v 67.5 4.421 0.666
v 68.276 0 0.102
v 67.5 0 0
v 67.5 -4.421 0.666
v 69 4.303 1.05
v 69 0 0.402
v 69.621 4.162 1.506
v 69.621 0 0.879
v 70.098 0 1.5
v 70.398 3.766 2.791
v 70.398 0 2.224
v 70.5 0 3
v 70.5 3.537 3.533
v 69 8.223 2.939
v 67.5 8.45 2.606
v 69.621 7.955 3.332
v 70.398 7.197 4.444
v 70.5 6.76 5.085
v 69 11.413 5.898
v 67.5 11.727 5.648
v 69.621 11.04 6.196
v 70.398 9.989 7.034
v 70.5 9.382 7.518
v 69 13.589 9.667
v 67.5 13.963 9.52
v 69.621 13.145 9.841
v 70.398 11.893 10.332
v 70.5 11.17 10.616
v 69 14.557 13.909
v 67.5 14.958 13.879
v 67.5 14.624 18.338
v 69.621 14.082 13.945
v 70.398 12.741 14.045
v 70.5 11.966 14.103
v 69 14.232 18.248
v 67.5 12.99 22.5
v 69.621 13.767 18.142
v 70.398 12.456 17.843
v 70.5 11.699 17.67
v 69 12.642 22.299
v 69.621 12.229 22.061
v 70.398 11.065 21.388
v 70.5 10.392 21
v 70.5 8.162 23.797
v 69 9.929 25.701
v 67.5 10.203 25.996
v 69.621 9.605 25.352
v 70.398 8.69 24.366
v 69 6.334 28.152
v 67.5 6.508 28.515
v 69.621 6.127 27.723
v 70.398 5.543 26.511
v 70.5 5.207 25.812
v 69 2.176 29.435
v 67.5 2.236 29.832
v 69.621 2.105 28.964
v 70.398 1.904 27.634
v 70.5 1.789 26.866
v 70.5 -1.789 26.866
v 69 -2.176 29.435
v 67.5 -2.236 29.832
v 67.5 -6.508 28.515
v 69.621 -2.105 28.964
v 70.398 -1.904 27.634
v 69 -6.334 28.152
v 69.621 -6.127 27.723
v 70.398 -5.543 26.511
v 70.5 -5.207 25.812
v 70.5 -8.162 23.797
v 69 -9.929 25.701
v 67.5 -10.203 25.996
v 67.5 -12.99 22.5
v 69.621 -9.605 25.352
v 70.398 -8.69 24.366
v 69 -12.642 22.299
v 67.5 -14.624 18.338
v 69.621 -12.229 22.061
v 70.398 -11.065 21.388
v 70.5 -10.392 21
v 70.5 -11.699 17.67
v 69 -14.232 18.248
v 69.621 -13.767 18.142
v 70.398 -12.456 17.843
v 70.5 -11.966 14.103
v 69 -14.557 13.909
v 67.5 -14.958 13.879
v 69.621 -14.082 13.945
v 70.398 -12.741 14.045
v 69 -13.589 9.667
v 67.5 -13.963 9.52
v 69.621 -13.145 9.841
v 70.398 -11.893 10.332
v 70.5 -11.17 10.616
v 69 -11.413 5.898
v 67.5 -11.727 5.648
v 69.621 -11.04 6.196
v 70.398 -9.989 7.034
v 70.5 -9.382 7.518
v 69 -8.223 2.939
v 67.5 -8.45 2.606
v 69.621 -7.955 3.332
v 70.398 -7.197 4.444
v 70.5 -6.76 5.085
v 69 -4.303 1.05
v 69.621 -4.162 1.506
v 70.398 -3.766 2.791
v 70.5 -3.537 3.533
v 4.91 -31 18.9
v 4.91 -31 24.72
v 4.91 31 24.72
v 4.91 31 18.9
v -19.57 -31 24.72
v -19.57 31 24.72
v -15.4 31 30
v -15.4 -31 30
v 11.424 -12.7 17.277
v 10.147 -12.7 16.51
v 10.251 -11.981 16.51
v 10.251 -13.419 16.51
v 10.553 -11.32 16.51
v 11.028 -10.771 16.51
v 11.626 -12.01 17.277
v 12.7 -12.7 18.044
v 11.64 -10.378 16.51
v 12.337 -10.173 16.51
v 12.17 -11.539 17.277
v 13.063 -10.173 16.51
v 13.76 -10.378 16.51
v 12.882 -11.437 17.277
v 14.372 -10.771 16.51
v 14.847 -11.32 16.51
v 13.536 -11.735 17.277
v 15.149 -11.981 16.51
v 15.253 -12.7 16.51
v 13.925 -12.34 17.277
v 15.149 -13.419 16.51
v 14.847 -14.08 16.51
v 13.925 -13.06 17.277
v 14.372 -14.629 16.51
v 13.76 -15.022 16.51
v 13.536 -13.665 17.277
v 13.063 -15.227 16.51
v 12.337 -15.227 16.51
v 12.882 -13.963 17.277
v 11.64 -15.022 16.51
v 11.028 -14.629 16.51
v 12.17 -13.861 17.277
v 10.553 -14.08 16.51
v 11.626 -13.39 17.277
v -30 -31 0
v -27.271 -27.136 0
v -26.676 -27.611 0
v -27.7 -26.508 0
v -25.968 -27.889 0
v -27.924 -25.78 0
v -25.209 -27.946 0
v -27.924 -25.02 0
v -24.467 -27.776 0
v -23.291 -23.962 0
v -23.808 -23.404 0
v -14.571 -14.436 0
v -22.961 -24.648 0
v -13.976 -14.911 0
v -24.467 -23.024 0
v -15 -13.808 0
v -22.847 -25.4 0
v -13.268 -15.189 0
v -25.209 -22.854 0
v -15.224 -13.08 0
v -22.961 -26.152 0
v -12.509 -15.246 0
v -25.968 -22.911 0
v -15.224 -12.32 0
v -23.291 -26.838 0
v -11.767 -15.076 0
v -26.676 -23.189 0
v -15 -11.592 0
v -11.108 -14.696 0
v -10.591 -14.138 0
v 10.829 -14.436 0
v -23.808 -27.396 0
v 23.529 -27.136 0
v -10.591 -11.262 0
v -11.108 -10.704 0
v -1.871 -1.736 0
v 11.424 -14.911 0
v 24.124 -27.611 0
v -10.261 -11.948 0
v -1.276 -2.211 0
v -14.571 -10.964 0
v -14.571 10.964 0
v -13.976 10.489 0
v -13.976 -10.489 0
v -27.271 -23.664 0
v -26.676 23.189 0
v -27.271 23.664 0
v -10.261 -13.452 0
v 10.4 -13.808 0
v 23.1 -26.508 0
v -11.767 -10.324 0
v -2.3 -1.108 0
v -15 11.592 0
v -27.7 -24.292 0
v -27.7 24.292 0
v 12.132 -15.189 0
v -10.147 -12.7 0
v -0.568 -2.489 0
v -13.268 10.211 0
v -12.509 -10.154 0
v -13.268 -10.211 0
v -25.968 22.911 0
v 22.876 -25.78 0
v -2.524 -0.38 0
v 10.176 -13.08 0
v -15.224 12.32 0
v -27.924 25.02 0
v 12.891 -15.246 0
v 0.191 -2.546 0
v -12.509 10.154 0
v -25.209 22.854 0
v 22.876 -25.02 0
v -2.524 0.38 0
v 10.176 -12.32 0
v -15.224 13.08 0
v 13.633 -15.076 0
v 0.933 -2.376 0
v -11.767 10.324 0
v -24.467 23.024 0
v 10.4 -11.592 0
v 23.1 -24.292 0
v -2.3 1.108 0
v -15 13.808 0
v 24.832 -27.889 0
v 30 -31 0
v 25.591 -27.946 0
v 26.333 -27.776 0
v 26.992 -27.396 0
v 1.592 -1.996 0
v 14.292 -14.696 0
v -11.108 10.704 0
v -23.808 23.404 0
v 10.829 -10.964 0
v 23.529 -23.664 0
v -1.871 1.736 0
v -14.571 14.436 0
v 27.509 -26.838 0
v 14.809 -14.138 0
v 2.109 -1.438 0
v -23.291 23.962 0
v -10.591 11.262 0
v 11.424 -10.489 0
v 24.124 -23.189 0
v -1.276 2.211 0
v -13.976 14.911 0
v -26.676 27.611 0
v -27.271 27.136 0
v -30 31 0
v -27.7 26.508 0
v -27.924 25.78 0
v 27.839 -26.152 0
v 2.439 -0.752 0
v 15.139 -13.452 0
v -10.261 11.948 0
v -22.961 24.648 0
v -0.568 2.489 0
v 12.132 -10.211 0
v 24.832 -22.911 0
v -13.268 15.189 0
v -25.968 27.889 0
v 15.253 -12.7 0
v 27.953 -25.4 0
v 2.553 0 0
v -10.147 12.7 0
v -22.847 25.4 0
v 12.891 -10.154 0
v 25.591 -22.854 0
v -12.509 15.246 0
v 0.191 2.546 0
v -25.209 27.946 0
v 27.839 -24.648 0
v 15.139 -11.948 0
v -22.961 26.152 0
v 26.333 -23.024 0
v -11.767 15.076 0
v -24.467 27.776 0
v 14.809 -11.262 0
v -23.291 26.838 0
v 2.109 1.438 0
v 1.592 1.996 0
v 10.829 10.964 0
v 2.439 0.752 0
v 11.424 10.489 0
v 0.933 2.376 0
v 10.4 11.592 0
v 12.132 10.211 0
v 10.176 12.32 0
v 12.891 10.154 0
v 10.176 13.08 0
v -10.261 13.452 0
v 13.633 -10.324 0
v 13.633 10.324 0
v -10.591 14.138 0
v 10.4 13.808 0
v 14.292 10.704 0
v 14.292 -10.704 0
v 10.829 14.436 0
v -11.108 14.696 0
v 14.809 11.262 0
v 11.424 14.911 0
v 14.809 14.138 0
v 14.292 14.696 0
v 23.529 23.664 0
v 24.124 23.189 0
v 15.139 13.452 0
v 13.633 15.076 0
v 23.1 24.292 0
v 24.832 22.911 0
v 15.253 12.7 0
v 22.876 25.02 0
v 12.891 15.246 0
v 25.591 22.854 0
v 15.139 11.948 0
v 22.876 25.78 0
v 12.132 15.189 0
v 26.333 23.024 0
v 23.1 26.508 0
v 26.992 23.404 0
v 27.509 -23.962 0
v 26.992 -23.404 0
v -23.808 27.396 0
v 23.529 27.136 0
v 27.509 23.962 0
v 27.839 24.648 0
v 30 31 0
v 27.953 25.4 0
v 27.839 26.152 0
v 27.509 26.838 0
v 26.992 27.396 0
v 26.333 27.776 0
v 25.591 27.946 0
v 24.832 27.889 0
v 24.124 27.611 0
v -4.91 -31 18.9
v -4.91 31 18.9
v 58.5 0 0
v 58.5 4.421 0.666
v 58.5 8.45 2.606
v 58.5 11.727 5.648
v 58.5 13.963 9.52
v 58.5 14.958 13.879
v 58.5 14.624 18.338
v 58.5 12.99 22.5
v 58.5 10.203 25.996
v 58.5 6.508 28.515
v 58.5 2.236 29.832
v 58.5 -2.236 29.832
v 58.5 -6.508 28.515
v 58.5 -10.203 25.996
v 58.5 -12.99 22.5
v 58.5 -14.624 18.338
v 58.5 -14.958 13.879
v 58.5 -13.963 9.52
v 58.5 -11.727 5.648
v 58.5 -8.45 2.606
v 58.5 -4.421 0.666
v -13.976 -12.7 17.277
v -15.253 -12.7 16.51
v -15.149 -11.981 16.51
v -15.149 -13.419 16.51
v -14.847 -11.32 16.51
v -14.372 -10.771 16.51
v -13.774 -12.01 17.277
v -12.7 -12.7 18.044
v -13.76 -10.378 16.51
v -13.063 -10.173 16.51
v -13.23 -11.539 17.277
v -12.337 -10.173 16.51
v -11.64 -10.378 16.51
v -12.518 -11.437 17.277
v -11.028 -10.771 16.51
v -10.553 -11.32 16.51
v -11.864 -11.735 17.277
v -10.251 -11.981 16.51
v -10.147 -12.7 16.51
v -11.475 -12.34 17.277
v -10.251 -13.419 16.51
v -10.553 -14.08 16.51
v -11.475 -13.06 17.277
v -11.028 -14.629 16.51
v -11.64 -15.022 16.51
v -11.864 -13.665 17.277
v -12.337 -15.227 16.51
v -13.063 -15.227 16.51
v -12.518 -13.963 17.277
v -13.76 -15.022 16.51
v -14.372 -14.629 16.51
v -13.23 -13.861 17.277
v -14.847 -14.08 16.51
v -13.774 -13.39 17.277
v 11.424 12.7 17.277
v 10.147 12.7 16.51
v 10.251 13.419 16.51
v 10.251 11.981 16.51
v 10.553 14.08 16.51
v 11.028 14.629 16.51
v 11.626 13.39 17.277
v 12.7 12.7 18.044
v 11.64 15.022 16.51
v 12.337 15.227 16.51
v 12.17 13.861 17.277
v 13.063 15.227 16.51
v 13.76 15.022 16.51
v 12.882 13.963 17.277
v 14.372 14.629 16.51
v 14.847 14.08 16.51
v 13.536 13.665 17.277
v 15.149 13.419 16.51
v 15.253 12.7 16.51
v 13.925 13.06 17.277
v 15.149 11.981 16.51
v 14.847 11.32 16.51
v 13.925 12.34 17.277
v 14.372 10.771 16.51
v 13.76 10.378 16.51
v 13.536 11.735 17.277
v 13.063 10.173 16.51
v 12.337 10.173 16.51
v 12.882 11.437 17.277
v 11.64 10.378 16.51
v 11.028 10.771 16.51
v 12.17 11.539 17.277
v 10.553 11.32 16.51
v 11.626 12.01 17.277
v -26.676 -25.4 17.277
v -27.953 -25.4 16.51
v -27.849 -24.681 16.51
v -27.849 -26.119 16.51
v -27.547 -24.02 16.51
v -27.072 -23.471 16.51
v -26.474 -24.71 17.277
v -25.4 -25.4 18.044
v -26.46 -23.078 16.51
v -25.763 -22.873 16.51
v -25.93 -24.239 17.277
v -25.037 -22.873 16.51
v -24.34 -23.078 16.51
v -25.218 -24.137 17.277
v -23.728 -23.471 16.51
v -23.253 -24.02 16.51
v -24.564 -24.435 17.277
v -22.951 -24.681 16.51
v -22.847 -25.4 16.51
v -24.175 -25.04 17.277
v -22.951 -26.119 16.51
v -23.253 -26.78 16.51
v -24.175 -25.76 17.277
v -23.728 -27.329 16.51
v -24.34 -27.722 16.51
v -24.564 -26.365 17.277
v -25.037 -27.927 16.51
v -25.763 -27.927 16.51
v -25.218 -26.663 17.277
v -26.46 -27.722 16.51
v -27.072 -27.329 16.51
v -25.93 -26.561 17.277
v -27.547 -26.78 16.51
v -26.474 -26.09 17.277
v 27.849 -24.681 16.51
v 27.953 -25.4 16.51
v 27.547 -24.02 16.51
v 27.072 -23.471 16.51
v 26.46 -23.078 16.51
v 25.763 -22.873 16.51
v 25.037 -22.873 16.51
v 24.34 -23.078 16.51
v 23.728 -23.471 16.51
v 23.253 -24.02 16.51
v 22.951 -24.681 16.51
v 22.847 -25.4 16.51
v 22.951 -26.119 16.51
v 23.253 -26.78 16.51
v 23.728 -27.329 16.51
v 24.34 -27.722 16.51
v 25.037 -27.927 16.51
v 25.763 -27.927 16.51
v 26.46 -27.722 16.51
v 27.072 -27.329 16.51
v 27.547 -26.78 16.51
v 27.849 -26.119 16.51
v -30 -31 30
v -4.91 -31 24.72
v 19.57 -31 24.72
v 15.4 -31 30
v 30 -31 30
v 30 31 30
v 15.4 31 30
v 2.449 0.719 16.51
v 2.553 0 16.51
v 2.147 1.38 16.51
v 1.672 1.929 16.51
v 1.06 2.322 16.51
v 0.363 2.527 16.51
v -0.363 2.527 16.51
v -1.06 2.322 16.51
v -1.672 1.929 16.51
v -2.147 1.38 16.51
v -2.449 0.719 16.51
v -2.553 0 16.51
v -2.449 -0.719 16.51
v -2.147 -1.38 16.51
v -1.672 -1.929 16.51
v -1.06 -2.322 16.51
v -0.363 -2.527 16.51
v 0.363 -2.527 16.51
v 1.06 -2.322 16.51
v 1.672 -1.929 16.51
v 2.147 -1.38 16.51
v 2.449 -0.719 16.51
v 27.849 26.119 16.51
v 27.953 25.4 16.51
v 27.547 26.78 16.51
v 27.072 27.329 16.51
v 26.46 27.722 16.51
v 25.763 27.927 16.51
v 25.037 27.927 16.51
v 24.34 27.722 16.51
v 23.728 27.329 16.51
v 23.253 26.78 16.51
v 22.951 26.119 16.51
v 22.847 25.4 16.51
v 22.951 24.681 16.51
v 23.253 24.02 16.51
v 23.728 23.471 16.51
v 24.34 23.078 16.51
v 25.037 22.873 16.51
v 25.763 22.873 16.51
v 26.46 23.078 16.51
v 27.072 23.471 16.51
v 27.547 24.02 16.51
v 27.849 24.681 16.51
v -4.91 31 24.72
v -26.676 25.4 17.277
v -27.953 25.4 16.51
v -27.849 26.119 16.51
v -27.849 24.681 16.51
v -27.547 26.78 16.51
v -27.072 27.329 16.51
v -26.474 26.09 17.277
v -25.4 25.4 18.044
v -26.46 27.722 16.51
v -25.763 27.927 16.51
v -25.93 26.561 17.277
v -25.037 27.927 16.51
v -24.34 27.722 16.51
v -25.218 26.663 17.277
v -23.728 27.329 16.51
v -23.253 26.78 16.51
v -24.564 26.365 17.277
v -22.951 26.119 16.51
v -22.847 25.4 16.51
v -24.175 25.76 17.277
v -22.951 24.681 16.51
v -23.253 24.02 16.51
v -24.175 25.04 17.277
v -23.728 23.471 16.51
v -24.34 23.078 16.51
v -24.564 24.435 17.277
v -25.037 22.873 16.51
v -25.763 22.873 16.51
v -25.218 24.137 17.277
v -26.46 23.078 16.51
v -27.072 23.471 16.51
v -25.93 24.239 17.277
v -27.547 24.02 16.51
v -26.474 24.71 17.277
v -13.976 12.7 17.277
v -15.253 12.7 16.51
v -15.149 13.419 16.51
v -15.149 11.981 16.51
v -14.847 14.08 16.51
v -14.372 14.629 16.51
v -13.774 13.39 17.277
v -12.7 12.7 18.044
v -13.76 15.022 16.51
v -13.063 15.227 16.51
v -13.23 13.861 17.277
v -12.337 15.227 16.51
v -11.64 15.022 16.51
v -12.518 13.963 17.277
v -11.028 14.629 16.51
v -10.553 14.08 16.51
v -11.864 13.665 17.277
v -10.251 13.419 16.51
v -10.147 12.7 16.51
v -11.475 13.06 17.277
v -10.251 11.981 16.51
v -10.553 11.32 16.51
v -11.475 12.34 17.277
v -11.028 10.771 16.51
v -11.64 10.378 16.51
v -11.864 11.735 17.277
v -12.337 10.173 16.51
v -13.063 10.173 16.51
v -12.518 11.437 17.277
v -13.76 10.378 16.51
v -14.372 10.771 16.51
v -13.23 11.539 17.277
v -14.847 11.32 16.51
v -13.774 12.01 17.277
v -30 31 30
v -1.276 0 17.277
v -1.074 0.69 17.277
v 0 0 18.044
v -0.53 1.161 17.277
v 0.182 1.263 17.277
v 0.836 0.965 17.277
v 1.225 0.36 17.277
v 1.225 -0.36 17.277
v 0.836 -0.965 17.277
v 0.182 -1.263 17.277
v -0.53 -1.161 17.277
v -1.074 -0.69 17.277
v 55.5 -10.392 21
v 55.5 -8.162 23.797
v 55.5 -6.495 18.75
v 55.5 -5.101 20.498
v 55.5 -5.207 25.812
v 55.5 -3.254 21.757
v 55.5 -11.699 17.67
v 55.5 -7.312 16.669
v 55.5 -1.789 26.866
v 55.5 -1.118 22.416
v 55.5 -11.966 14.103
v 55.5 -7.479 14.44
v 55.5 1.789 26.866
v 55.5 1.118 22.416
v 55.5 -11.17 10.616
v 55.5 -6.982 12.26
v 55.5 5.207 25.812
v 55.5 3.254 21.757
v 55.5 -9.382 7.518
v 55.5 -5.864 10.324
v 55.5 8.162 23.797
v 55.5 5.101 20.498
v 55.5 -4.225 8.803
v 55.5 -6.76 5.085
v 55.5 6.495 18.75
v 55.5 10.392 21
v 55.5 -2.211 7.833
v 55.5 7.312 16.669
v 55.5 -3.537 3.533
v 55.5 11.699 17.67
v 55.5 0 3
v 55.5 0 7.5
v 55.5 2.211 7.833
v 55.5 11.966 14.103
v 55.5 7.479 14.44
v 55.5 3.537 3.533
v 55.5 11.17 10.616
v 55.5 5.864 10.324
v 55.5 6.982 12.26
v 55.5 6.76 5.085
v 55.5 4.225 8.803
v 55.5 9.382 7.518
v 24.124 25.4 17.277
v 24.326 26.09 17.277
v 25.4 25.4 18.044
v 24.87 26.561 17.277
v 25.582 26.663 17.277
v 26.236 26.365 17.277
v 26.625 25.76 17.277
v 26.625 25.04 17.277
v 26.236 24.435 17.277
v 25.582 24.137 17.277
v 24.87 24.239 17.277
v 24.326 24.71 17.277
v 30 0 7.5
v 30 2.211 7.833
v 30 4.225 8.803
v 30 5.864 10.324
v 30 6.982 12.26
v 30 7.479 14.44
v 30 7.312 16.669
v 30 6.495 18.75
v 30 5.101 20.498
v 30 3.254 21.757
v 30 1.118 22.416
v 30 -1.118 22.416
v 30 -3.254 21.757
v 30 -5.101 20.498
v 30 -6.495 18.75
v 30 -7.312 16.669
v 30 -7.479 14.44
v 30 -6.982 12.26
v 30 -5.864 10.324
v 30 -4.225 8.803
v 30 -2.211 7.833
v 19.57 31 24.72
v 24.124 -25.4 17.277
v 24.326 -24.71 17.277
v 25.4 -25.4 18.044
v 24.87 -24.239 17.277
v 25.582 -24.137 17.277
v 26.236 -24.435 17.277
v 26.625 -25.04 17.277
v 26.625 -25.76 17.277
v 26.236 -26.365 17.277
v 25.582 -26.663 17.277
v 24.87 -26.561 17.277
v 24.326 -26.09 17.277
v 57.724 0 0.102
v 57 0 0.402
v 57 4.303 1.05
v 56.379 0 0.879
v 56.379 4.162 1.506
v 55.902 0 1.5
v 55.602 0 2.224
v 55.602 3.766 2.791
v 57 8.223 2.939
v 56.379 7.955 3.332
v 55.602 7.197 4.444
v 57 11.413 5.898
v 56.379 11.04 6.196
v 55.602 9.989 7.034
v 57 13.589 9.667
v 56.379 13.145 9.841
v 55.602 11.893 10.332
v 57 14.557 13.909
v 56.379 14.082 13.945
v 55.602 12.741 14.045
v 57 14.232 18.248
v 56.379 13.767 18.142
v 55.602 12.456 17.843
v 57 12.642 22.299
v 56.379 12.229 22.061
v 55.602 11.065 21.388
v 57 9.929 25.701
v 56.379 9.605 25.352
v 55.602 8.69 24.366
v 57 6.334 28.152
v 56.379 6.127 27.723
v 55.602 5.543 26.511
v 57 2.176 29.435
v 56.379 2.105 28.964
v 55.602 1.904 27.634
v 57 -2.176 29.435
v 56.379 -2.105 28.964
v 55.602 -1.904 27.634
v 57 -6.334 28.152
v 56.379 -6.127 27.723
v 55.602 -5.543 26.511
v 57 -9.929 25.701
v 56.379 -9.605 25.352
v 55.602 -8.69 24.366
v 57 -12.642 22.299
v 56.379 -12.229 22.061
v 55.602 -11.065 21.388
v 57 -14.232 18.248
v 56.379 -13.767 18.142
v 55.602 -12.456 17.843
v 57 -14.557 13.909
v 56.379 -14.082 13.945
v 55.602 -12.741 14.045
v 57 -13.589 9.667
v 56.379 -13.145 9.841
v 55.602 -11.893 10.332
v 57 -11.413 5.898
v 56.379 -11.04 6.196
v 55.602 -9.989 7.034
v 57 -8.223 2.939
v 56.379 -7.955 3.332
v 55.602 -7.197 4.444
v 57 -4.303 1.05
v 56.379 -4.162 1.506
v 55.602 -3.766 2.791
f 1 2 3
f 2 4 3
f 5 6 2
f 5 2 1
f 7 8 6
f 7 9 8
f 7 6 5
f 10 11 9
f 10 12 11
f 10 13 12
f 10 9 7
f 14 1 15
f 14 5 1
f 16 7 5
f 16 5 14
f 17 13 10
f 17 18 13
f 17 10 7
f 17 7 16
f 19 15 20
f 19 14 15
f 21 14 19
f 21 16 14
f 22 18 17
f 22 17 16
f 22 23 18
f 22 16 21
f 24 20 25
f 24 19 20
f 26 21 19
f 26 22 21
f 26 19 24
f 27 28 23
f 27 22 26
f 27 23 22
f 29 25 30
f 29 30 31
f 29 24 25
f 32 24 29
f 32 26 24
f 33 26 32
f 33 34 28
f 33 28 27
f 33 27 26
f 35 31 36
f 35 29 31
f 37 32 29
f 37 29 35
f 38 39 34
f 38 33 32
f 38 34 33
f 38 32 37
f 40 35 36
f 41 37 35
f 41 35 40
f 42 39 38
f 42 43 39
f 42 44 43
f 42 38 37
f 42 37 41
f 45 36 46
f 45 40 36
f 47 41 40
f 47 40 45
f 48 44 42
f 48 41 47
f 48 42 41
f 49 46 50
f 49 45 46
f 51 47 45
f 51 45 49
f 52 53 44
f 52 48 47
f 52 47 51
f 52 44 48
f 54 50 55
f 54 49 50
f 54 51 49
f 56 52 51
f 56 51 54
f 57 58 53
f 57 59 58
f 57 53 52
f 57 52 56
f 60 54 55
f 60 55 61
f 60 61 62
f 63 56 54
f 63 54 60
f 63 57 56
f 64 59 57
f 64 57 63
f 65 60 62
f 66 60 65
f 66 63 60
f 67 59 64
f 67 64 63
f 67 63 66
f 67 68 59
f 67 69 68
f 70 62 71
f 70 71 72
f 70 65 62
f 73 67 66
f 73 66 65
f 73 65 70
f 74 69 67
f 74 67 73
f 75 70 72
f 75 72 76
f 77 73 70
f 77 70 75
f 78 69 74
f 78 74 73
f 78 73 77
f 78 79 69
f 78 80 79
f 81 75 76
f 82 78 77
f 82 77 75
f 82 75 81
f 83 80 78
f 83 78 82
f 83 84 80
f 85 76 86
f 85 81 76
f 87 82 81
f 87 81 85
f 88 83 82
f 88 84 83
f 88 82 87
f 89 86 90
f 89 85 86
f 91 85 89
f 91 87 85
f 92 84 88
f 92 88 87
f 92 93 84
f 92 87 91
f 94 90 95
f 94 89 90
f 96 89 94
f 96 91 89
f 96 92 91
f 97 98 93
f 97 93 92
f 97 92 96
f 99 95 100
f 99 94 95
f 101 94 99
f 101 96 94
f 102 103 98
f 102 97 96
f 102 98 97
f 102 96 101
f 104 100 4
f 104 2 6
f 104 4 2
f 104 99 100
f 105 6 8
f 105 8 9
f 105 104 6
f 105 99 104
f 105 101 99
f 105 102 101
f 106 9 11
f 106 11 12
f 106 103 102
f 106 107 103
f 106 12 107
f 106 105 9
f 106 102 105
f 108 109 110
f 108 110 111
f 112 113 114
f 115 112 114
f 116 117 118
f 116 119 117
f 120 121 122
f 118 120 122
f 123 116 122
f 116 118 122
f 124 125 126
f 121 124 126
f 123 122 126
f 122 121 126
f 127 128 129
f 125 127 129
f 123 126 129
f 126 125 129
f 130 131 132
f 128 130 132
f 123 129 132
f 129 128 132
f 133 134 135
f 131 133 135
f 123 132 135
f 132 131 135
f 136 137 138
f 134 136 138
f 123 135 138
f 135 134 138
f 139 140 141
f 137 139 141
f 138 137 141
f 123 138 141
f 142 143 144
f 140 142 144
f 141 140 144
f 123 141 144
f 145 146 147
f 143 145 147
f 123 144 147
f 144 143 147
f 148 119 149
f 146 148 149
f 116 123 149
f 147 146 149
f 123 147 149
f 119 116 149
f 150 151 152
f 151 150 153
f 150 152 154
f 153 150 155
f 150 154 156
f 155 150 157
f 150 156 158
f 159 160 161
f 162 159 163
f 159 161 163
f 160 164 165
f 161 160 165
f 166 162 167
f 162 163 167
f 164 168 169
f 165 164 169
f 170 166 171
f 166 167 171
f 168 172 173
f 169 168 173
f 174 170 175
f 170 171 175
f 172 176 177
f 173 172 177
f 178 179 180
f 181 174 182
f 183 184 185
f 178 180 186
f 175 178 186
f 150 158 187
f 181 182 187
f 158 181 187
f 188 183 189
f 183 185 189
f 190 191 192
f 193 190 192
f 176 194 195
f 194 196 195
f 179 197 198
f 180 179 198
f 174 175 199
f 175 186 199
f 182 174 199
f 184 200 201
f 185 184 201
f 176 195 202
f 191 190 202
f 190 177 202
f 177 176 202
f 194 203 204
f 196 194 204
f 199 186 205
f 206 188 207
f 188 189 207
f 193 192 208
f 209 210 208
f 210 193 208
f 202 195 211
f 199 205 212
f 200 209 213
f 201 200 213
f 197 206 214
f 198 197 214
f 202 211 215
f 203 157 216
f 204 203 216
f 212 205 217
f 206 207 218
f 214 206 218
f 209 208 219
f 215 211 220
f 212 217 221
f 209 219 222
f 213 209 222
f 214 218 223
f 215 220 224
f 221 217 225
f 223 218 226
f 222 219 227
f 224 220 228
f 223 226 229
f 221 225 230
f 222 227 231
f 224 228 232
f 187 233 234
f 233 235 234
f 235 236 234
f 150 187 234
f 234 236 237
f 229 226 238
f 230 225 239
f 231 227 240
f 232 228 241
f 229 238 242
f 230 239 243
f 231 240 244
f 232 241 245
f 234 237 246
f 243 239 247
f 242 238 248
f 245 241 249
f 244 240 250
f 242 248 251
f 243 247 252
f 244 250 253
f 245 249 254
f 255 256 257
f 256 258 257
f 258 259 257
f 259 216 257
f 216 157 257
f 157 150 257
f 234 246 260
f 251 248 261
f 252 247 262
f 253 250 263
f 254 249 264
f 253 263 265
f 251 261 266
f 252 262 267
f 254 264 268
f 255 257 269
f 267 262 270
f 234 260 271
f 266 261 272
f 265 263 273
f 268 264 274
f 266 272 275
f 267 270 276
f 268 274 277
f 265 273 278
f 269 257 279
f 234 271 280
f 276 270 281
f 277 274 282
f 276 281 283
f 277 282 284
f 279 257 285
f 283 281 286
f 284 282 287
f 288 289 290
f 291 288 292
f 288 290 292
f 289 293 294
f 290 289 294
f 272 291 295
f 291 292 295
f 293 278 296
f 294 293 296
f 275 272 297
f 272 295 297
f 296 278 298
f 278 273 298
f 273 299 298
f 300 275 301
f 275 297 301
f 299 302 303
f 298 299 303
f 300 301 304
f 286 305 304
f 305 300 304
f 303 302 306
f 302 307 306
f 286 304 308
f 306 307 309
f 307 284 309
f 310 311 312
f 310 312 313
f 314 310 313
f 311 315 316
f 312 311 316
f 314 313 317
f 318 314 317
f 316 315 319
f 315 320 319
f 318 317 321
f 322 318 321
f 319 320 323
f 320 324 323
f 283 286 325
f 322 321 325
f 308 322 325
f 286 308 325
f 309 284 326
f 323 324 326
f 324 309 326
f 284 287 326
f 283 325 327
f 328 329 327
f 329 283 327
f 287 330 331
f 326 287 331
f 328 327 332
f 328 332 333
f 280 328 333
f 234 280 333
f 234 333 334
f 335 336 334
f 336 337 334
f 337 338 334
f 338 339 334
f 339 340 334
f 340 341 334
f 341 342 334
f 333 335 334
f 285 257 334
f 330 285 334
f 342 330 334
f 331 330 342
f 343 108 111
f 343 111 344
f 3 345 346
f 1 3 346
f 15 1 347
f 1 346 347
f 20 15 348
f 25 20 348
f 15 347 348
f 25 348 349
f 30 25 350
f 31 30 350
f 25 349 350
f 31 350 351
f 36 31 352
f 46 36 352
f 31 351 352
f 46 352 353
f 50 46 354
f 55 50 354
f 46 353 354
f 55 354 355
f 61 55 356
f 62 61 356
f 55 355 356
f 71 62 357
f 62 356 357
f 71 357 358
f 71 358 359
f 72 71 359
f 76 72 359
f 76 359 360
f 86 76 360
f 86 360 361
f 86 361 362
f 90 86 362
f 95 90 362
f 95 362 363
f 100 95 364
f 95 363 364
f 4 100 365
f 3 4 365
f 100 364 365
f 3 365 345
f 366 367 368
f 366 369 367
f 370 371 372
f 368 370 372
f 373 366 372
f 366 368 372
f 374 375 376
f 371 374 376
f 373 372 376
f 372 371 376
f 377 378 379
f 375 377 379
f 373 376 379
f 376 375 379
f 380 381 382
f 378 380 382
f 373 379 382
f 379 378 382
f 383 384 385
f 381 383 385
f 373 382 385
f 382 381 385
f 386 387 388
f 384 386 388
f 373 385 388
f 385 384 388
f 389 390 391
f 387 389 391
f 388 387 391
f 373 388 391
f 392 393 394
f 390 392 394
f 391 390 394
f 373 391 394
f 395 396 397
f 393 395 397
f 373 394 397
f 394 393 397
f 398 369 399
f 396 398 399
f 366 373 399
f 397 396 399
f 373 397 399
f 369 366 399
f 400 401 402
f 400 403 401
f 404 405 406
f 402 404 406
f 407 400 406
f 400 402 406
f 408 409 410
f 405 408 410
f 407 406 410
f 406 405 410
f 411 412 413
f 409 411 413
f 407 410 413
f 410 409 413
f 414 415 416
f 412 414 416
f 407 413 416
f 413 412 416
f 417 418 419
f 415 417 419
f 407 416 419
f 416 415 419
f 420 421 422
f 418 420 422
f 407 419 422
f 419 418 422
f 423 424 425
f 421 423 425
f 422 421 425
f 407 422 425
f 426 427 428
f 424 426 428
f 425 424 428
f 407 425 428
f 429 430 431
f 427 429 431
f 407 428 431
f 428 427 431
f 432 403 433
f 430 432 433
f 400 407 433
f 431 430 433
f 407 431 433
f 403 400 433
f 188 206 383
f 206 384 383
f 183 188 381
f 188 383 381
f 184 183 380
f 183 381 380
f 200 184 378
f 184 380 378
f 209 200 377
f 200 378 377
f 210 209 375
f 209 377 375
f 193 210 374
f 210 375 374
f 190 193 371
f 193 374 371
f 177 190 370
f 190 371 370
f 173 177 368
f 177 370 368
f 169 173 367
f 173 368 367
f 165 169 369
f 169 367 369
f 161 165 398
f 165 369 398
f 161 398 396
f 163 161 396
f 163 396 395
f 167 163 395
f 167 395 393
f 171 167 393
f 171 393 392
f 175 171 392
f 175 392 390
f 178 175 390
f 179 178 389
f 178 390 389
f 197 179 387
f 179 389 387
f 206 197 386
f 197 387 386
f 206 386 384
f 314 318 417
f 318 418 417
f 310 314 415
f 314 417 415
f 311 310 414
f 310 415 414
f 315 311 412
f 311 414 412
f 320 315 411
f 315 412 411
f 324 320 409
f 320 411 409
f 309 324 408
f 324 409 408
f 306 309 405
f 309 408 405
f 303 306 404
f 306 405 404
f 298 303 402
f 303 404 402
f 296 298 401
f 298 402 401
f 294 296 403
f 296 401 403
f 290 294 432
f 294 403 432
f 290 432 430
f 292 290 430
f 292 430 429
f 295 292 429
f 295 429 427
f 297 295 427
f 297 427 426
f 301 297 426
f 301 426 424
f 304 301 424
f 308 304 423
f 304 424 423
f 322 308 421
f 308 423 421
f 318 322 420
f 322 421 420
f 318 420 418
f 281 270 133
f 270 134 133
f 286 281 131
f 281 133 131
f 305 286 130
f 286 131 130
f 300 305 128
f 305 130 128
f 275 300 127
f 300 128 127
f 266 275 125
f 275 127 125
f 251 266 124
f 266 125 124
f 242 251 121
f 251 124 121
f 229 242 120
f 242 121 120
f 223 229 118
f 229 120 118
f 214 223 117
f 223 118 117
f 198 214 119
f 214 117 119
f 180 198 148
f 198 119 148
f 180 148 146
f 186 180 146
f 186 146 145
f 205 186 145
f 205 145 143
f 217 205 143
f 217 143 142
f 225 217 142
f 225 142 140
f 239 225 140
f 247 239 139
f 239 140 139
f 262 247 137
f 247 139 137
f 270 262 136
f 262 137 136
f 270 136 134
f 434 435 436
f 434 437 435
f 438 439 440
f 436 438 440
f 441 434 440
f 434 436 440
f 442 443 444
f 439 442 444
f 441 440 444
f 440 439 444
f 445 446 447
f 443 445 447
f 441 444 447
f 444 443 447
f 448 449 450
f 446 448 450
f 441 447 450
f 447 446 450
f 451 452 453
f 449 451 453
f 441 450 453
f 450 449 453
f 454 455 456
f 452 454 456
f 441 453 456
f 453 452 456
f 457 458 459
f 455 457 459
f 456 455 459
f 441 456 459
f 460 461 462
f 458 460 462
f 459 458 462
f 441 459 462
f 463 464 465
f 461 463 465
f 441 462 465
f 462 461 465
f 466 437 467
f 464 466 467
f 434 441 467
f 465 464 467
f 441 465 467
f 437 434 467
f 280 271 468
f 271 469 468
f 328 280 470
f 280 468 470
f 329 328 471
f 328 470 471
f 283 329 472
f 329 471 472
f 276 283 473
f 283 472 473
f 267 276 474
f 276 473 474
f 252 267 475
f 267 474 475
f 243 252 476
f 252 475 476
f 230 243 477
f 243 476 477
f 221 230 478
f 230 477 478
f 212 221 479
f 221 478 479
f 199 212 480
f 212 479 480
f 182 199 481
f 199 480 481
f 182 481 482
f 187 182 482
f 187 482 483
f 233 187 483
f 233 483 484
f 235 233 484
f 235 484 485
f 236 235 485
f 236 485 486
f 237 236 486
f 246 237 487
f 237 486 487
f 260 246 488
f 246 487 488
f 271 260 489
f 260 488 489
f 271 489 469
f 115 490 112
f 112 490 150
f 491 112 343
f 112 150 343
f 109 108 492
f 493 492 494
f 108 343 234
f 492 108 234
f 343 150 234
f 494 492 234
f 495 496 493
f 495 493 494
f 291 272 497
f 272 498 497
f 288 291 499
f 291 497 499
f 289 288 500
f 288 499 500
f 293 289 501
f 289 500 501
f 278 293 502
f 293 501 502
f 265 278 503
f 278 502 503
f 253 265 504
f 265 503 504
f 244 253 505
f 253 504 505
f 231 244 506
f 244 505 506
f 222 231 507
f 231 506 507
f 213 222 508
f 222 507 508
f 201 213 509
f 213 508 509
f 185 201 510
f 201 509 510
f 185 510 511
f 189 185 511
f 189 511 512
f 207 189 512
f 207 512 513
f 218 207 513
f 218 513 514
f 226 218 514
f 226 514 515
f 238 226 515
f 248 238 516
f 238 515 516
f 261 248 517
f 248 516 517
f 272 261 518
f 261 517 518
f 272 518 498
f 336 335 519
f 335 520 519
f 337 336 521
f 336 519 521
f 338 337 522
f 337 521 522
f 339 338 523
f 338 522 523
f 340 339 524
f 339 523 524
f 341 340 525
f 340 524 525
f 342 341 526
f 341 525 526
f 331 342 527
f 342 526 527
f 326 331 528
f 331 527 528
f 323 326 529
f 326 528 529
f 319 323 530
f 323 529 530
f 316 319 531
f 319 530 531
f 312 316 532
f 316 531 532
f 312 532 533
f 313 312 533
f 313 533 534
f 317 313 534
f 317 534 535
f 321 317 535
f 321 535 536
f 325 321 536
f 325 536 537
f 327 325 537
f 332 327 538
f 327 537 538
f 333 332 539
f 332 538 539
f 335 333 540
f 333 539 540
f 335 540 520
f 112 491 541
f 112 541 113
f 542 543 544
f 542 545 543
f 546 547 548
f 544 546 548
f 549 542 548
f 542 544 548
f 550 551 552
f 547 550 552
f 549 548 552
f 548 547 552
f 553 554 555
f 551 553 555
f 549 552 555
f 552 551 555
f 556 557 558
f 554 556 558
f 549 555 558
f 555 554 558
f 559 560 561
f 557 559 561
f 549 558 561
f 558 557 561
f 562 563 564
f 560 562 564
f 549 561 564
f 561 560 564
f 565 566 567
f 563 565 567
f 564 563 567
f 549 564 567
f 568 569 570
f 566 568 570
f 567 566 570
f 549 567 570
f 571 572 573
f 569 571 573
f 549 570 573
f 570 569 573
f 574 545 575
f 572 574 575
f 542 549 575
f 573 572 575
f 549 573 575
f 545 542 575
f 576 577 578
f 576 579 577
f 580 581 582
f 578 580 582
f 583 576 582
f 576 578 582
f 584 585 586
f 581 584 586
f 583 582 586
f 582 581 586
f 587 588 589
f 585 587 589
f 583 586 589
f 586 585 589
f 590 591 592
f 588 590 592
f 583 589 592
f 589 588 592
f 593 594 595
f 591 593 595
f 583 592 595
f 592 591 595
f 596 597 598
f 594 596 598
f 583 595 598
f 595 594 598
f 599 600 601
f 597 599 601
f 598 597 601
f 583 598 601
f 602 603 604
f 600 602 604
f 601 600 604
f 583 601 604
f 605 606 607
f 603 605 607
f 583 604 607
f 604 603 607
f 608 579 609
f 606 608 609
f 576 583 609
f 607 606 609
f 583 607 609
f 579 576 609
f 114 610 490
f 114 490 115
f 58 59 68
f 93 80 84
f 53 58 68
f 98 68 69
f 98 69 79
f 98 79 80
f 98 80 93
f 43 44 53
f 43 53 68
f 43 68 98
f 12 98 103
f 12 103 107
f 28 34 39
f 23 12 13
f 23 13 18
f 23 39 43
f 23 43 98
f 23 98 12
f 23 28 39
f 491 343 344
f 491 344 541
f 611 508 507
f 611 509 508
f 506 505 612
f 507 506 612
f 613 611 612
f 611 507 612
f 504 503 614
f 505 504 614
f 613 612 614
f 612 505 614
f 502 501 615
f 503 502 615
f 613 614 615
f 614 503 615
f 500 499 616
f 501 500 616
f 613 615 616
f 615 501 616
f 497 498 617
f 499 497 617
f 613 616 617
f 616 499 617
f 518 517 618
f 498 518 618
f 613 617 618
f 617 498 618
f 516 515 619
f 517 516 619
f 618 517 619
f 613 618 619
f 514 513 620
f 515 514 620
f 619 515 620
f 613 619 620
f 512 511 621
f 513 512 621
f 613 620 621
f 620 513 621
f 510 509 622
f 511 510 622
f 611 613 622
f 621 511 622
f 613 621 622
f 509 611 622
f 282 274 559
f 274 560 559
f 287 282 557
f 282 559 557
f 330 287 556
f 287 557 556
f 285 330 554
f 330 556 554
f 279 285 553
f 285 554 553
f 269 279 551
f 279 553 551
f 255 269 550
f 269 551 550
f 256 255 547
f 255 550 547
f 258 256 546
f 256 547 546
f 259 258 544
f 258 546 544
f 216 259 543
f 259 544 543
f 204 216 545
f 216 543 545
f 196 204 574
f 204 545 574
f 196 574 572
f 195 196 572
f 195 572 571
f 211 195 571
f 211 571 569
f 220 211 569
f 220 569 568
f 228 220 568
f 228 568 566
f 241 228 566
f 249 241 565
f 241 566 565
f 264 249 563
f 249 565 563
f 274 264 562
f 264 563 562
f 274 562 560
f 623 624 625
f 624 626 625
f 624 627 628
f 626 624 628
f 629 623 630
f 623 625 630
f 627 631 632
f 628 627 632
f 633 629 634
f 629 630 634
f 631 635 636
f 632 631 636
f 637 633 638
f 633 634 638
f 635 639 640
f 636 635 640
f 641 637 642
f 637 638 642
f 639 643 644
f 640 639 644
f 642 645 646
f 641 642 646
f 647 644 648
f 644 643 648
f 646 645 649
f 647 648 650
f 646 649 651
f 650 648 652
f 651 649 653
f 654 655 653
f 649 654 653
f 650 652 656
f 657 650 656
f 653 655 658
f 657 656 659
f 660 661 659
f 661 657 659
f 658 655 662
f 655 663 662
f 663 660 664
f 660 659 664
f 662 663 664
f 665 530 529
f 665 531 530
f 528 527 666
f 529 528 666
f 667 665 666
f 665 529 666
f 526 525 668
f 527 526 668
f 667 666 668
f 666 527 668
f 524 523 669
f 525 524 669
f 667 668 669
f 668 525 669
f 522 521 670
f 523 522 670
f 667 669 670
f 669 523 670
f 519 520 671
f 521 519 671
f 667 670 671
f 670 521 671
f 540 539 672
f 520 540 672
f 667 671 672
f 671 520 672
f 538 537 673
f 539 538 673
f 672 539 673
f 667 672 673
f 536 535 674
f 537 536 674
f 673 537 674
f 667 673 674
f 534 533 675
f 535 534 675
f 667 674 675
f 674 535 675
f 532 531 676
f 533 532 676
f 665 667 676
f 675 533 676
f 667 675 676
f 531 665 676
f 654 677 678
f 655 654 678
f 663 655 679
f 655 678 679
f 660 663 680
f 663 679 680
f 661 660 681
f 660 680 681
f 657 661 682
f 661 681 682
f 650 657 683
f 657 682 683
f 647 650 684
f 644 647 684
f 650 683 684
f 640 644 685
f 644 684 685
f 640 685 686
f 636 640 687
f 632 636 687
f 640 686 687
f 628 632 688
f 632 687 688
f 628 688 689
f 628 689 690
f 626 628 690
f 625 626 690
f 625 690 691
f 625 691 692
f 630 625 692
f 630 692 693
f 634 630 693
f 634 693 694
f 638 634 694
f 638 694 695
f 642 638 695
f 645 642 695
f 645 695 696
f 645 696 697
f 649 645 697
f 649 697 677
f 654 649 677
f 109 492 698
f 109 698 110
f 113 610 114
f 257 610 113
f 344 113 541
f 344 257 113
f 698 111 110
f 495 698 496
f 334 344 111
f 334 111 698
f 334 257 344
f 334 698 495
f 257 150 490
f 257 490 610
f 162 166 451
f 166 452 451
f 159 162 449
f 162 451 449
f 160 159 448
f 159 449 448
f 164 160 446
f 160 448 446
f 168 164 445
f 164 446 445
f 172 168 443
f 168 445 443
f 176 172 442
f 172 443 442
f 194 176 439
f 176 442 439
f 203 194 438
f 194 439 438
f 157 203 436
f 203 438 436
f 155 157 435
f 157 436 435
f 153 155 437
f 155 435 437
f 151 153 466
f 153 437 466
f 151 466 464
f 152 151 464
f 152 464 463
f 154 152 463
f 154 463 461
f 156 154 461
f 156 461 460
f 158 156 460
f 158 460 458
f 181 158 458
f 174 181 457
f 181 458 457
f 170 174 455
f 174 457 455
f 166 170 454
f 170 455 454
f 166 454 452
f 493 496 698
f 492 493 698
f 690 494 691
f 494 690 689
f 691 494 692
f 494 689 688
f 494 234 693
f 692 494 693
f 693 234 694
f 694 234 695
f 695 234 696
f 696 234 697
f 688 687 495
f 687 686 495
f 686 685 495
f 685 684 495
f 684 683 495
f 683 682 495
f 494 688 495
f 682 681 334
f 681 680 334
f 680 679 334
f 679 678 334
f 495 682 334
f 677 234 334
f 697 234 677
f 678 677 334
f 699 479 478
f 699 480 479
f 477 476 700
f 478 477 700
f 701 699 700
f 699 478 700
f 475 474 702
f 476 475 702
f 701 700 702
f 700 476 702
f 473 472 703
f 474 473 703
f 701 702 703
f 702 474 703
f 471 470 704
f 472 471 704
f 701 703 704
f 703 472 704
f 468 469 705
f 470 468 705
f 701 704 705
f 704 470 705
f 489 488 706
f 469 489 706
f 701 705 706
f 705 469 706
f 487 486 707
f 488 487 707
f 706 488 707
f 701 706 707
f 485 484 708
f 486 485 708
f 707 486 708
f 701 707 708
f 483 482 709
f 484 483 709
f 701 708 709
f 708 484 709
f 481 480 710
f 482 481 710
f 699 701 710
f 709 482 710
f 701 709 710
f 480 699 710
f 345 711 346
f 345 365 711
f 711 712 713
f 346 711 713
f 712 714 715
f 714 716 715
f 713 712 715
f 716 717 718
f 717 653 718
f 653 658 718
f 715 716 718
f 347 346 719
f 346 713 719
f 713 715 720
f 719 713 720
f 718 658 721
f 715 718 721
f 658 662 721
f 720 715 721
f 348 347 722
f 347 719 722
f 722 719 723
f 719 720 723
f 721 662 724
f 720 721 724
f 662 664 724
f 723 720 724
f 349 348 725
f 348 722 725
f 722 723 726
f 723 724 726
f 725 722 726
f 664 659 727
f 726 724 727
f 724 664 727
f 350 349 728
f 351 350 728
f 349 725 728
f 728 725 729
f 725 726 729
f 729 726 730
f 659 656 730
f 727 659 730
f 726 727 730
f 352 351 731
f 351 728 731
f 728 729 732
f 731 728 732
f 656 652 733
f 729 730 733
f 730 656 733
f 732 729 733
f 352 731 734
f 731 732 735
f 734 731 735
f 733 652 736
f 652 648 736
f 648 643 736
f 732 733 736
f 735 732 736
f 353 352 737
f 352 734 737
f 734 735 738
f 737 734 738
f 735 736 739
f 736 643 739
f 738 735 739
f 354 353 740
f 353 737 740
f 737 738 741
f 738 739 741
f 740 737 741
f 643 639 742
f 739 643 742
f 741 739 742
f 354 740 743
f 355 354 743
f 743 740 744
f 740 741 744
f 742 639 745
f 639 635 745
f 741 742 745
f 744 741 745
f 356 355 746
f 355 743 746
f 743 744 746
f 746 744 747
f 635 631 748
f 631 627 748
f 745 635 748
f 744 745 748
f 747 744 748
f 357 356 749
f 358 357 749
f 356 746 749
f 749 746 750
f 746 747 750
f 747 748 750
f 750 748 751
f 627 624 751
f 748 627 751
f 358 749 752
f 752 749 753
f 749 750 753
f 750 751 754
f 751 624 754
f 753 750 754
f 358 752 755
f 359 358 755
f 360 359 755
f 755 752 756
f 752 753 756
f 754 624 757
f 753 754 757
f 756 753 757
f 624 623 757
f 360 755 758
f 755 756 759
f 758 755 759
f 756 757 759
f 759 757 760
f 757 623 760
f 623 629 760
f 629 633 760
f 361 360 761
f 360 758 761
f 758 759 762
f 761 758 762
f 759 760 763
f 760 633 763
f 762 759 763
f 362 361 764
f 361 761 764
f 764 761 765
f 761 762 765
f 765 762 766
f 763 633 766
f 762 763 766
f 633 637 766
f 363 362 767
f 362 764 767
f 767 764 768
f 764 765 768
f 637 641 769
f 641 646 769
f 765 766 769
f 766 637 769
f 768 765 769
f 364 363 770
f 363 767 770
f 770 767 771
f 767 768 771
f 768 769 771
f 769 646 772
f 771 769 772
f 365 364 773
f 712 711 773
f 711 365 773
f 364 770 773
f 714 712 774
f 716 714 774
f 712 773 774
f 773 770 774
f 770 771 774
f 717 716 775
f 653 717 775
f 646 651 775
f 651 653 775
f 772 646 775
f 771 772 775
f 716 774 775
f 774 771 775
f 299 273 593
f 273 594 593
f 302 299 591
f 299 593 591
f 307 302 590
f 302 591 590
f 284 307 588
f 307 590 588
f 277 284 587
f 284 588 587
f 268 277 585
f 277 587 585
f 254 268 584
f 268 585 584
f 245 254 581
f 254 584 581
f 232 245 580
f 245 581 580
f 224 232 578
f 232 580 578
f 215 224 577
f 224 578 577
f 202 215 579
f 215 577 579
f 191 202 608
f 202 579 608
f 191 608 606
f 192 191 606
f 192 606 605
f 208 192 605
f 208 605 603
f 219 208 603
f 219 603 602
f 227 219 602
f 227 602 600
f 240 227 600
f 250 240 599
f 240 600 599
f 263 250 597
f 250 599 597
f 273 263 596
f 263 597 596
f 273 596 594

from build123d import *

# Parameters (mm, degrees)
SKETCH1_W                   = 60
SKETCH1_H                   = 62
BOSS_EXTRUDE1_DEPTH         = 30
SKETCH3_R                   = 7.5
BOSS_EXTRUDE2_DEPTH         = 25.5
SKETCH4_R                   = 15
BOSS_EXTRUDE3_DEPTH         = 15
FILLET1_R                   = 3
SKETCH1_3_W                 = 60
SKETCH1_3_H                 = 62
SKETCH1_3_R                 = 3.175
BOSS_EXTRUDE4_DEPTH         = 20
F_1_4_20_TAPPED_HOLE1_D     = 5.1054
F_1_4_20_TAPPED_HOLE1_DEPTH = 16.51
F_1_4_20_TAPPED_HOLE1_TIP   = 1.533816902
F_1_4_20_TAPPED_HOLE2_D     = 5.1054
F_1_4_20_TAPPED_HOLE2_DEPTH = 16.51
F_1_4_20_TAPPED_HOLE2_TIP   = 1.533816902
CUT_EXTRUDE1_DEPTH          = 63


with BuildPart() as part:
    # Sketch1 → Boss-Extrude1 (new body)
    with BuildSketch(Plane.XY):
        Rectangle(SKETCH1_W, SKETCH1_H)
    extrude(amount=BOSS_EXTRUDE1_DEPTH)

    # Sketch3 → Boss-Extrude2 (add)
    with BuildSketch(Plane(origin=(30, 0, 0), x_dir=(0, 0, -1), z_dir=(1, 0, 0))):
        with Locations((-15, 0)):
            Circle(SKETCH3_R)
    extrude(amount=BOSS_EXTRUDE2_DEPTH)

    # Sketch4 → Boss-Extrude3 (add)
    with BuildSketch(Plane(origin=(55.5, 0, 0), x_dir=(0, 0, -1), z_dir=(1, 0, 0))):
        with Locations((-15, 0)):
            Circle(SKETCH4_R)
    extrude(amount=BOSS_EXTRUDE3_DEPTH)

    # Fillet1
    fillet1_edges = [part.edges().sort_by_distance(p)[0] for p in [
        (55.5, 0, 30),
        (70.5, 0, 30),
    ]]
    fillet(fillet1_edges, radius=FILLET1_R)

    # Sketch1<3> → Boss-Extrude4 (add)
    with BuildSketch(Plane.XY):
        Rectangle(SKETCH1_3_W, SKETCH1_3_H)
        Circle(SKETCH1_3_R, mode=Mode.SUBTRACT)
        with Locations((25.4, 25.4)):
            Circle(SKETCH1_3_R, mode=Mode.SUBTRACT)
        with Locations((-25.4, 25.4)):
            Circle(SKETCH1_3_R, mode=Mode.SUBTRACT)
        with Locations((-25.4, -25.4)):
            Circle(SKETCH1_3_R, mode=Mode.SUBTRACT)
        with Locations((25.4, -25.4)):
            Circle(SKETCH1_3_R, mode=Mode.SUBTRACT)
        with Locations((-12.7, 12.7)):
            Circle(SKETCH1_3_R, mode=Mode.SUBTRACT)
        with Locations((12.7, 12.7)):
            Circle(SKETCH1_3_R, mode=Mode.SUBTRACT)
        with Locations((-12.7, -12.7)):
            Circle(SKETCH1_3_R, mode=Mode.SUBTRACT)
        with Locations((12.7, -12.7)):
            Circle(SKETCH1_3_R, mode=Mode.SUBTRACT)
    extrude(amount=BOSS_EXTRUDE4_DEPTH)

    # 1/4-20 Tapped Hole1
    with Locations(Plane(origin=(0, 0, 0), x_dir=(-1, 0, 0), z_dir=(0, 0, -1))):
        with Locations((-25.4, 25.4), (25.4, 25.4), (25.4, -25.4), (-25.4, -25.4)):
            Hole(F_1_4_20_TAPPED_HOLE1_D / 2, depth=F_1_4_20_TAPPED_HOLE1_DEPTH)
            with Locations((0, 0, -(F_1_4_20_TAPPED_HOLE1_DEPTH + F_1_4_20_TAPPED_HOLE1_TIP / 2))):  # 118° drill point
                Cone(0, F_1_4_20_TAPPED_HOLE1_D / 2, F_1_4_20_TAPPED_HOLE1_TIP, mode=Mode.SUBTRACT)

    # 1/4-20 Tapped Hole2
    with Locations(Plane(origin=(0, 0, 0), x_dir=(-1, 0, 0), z_dir=(0, 0, -1))):
        with Locations((-12.7, 12.7), (0, 0), (12.7, 12.7), (12.7, -12.7), (-12.7, -12.7)):
            Hole(F_1_4_20_TAPPED_HOLE2_D / 2, depth=F_1_4_20_TAPPED_HOLE2_DEPTH)
            with Locations((0, 0, -(F_1_4_20_TAPPED_HOLE2_DEPTH + F_1_4_20_TAPPED_HOLE2_TIP / 2))):  # 118° drill point
                Cone(0, F_1_4_20_TAPPED_HOLE2_D / 2, F_1_4_20_TAPPED_HOLE2_TIP, mode=Mode.SUBTRACT)

    # Sketch16 → Cut-Extrude1 (cut, through all)
    with BuildSketch(Plane.XZ.offset(31)):
        Polygon((-4.91, 24.72), (-19.57, 24.72), (-15.4, 30), (15.4, 30), (19.57, 24.72), (4.91, 24.72), (4.91, 18.9), (-4.91, 18.9), align=None)
    extrude(amount=-CUT_EXTRUDE1_DEPTH, mode=Mode.SUBTRACT)


solid = part.part
